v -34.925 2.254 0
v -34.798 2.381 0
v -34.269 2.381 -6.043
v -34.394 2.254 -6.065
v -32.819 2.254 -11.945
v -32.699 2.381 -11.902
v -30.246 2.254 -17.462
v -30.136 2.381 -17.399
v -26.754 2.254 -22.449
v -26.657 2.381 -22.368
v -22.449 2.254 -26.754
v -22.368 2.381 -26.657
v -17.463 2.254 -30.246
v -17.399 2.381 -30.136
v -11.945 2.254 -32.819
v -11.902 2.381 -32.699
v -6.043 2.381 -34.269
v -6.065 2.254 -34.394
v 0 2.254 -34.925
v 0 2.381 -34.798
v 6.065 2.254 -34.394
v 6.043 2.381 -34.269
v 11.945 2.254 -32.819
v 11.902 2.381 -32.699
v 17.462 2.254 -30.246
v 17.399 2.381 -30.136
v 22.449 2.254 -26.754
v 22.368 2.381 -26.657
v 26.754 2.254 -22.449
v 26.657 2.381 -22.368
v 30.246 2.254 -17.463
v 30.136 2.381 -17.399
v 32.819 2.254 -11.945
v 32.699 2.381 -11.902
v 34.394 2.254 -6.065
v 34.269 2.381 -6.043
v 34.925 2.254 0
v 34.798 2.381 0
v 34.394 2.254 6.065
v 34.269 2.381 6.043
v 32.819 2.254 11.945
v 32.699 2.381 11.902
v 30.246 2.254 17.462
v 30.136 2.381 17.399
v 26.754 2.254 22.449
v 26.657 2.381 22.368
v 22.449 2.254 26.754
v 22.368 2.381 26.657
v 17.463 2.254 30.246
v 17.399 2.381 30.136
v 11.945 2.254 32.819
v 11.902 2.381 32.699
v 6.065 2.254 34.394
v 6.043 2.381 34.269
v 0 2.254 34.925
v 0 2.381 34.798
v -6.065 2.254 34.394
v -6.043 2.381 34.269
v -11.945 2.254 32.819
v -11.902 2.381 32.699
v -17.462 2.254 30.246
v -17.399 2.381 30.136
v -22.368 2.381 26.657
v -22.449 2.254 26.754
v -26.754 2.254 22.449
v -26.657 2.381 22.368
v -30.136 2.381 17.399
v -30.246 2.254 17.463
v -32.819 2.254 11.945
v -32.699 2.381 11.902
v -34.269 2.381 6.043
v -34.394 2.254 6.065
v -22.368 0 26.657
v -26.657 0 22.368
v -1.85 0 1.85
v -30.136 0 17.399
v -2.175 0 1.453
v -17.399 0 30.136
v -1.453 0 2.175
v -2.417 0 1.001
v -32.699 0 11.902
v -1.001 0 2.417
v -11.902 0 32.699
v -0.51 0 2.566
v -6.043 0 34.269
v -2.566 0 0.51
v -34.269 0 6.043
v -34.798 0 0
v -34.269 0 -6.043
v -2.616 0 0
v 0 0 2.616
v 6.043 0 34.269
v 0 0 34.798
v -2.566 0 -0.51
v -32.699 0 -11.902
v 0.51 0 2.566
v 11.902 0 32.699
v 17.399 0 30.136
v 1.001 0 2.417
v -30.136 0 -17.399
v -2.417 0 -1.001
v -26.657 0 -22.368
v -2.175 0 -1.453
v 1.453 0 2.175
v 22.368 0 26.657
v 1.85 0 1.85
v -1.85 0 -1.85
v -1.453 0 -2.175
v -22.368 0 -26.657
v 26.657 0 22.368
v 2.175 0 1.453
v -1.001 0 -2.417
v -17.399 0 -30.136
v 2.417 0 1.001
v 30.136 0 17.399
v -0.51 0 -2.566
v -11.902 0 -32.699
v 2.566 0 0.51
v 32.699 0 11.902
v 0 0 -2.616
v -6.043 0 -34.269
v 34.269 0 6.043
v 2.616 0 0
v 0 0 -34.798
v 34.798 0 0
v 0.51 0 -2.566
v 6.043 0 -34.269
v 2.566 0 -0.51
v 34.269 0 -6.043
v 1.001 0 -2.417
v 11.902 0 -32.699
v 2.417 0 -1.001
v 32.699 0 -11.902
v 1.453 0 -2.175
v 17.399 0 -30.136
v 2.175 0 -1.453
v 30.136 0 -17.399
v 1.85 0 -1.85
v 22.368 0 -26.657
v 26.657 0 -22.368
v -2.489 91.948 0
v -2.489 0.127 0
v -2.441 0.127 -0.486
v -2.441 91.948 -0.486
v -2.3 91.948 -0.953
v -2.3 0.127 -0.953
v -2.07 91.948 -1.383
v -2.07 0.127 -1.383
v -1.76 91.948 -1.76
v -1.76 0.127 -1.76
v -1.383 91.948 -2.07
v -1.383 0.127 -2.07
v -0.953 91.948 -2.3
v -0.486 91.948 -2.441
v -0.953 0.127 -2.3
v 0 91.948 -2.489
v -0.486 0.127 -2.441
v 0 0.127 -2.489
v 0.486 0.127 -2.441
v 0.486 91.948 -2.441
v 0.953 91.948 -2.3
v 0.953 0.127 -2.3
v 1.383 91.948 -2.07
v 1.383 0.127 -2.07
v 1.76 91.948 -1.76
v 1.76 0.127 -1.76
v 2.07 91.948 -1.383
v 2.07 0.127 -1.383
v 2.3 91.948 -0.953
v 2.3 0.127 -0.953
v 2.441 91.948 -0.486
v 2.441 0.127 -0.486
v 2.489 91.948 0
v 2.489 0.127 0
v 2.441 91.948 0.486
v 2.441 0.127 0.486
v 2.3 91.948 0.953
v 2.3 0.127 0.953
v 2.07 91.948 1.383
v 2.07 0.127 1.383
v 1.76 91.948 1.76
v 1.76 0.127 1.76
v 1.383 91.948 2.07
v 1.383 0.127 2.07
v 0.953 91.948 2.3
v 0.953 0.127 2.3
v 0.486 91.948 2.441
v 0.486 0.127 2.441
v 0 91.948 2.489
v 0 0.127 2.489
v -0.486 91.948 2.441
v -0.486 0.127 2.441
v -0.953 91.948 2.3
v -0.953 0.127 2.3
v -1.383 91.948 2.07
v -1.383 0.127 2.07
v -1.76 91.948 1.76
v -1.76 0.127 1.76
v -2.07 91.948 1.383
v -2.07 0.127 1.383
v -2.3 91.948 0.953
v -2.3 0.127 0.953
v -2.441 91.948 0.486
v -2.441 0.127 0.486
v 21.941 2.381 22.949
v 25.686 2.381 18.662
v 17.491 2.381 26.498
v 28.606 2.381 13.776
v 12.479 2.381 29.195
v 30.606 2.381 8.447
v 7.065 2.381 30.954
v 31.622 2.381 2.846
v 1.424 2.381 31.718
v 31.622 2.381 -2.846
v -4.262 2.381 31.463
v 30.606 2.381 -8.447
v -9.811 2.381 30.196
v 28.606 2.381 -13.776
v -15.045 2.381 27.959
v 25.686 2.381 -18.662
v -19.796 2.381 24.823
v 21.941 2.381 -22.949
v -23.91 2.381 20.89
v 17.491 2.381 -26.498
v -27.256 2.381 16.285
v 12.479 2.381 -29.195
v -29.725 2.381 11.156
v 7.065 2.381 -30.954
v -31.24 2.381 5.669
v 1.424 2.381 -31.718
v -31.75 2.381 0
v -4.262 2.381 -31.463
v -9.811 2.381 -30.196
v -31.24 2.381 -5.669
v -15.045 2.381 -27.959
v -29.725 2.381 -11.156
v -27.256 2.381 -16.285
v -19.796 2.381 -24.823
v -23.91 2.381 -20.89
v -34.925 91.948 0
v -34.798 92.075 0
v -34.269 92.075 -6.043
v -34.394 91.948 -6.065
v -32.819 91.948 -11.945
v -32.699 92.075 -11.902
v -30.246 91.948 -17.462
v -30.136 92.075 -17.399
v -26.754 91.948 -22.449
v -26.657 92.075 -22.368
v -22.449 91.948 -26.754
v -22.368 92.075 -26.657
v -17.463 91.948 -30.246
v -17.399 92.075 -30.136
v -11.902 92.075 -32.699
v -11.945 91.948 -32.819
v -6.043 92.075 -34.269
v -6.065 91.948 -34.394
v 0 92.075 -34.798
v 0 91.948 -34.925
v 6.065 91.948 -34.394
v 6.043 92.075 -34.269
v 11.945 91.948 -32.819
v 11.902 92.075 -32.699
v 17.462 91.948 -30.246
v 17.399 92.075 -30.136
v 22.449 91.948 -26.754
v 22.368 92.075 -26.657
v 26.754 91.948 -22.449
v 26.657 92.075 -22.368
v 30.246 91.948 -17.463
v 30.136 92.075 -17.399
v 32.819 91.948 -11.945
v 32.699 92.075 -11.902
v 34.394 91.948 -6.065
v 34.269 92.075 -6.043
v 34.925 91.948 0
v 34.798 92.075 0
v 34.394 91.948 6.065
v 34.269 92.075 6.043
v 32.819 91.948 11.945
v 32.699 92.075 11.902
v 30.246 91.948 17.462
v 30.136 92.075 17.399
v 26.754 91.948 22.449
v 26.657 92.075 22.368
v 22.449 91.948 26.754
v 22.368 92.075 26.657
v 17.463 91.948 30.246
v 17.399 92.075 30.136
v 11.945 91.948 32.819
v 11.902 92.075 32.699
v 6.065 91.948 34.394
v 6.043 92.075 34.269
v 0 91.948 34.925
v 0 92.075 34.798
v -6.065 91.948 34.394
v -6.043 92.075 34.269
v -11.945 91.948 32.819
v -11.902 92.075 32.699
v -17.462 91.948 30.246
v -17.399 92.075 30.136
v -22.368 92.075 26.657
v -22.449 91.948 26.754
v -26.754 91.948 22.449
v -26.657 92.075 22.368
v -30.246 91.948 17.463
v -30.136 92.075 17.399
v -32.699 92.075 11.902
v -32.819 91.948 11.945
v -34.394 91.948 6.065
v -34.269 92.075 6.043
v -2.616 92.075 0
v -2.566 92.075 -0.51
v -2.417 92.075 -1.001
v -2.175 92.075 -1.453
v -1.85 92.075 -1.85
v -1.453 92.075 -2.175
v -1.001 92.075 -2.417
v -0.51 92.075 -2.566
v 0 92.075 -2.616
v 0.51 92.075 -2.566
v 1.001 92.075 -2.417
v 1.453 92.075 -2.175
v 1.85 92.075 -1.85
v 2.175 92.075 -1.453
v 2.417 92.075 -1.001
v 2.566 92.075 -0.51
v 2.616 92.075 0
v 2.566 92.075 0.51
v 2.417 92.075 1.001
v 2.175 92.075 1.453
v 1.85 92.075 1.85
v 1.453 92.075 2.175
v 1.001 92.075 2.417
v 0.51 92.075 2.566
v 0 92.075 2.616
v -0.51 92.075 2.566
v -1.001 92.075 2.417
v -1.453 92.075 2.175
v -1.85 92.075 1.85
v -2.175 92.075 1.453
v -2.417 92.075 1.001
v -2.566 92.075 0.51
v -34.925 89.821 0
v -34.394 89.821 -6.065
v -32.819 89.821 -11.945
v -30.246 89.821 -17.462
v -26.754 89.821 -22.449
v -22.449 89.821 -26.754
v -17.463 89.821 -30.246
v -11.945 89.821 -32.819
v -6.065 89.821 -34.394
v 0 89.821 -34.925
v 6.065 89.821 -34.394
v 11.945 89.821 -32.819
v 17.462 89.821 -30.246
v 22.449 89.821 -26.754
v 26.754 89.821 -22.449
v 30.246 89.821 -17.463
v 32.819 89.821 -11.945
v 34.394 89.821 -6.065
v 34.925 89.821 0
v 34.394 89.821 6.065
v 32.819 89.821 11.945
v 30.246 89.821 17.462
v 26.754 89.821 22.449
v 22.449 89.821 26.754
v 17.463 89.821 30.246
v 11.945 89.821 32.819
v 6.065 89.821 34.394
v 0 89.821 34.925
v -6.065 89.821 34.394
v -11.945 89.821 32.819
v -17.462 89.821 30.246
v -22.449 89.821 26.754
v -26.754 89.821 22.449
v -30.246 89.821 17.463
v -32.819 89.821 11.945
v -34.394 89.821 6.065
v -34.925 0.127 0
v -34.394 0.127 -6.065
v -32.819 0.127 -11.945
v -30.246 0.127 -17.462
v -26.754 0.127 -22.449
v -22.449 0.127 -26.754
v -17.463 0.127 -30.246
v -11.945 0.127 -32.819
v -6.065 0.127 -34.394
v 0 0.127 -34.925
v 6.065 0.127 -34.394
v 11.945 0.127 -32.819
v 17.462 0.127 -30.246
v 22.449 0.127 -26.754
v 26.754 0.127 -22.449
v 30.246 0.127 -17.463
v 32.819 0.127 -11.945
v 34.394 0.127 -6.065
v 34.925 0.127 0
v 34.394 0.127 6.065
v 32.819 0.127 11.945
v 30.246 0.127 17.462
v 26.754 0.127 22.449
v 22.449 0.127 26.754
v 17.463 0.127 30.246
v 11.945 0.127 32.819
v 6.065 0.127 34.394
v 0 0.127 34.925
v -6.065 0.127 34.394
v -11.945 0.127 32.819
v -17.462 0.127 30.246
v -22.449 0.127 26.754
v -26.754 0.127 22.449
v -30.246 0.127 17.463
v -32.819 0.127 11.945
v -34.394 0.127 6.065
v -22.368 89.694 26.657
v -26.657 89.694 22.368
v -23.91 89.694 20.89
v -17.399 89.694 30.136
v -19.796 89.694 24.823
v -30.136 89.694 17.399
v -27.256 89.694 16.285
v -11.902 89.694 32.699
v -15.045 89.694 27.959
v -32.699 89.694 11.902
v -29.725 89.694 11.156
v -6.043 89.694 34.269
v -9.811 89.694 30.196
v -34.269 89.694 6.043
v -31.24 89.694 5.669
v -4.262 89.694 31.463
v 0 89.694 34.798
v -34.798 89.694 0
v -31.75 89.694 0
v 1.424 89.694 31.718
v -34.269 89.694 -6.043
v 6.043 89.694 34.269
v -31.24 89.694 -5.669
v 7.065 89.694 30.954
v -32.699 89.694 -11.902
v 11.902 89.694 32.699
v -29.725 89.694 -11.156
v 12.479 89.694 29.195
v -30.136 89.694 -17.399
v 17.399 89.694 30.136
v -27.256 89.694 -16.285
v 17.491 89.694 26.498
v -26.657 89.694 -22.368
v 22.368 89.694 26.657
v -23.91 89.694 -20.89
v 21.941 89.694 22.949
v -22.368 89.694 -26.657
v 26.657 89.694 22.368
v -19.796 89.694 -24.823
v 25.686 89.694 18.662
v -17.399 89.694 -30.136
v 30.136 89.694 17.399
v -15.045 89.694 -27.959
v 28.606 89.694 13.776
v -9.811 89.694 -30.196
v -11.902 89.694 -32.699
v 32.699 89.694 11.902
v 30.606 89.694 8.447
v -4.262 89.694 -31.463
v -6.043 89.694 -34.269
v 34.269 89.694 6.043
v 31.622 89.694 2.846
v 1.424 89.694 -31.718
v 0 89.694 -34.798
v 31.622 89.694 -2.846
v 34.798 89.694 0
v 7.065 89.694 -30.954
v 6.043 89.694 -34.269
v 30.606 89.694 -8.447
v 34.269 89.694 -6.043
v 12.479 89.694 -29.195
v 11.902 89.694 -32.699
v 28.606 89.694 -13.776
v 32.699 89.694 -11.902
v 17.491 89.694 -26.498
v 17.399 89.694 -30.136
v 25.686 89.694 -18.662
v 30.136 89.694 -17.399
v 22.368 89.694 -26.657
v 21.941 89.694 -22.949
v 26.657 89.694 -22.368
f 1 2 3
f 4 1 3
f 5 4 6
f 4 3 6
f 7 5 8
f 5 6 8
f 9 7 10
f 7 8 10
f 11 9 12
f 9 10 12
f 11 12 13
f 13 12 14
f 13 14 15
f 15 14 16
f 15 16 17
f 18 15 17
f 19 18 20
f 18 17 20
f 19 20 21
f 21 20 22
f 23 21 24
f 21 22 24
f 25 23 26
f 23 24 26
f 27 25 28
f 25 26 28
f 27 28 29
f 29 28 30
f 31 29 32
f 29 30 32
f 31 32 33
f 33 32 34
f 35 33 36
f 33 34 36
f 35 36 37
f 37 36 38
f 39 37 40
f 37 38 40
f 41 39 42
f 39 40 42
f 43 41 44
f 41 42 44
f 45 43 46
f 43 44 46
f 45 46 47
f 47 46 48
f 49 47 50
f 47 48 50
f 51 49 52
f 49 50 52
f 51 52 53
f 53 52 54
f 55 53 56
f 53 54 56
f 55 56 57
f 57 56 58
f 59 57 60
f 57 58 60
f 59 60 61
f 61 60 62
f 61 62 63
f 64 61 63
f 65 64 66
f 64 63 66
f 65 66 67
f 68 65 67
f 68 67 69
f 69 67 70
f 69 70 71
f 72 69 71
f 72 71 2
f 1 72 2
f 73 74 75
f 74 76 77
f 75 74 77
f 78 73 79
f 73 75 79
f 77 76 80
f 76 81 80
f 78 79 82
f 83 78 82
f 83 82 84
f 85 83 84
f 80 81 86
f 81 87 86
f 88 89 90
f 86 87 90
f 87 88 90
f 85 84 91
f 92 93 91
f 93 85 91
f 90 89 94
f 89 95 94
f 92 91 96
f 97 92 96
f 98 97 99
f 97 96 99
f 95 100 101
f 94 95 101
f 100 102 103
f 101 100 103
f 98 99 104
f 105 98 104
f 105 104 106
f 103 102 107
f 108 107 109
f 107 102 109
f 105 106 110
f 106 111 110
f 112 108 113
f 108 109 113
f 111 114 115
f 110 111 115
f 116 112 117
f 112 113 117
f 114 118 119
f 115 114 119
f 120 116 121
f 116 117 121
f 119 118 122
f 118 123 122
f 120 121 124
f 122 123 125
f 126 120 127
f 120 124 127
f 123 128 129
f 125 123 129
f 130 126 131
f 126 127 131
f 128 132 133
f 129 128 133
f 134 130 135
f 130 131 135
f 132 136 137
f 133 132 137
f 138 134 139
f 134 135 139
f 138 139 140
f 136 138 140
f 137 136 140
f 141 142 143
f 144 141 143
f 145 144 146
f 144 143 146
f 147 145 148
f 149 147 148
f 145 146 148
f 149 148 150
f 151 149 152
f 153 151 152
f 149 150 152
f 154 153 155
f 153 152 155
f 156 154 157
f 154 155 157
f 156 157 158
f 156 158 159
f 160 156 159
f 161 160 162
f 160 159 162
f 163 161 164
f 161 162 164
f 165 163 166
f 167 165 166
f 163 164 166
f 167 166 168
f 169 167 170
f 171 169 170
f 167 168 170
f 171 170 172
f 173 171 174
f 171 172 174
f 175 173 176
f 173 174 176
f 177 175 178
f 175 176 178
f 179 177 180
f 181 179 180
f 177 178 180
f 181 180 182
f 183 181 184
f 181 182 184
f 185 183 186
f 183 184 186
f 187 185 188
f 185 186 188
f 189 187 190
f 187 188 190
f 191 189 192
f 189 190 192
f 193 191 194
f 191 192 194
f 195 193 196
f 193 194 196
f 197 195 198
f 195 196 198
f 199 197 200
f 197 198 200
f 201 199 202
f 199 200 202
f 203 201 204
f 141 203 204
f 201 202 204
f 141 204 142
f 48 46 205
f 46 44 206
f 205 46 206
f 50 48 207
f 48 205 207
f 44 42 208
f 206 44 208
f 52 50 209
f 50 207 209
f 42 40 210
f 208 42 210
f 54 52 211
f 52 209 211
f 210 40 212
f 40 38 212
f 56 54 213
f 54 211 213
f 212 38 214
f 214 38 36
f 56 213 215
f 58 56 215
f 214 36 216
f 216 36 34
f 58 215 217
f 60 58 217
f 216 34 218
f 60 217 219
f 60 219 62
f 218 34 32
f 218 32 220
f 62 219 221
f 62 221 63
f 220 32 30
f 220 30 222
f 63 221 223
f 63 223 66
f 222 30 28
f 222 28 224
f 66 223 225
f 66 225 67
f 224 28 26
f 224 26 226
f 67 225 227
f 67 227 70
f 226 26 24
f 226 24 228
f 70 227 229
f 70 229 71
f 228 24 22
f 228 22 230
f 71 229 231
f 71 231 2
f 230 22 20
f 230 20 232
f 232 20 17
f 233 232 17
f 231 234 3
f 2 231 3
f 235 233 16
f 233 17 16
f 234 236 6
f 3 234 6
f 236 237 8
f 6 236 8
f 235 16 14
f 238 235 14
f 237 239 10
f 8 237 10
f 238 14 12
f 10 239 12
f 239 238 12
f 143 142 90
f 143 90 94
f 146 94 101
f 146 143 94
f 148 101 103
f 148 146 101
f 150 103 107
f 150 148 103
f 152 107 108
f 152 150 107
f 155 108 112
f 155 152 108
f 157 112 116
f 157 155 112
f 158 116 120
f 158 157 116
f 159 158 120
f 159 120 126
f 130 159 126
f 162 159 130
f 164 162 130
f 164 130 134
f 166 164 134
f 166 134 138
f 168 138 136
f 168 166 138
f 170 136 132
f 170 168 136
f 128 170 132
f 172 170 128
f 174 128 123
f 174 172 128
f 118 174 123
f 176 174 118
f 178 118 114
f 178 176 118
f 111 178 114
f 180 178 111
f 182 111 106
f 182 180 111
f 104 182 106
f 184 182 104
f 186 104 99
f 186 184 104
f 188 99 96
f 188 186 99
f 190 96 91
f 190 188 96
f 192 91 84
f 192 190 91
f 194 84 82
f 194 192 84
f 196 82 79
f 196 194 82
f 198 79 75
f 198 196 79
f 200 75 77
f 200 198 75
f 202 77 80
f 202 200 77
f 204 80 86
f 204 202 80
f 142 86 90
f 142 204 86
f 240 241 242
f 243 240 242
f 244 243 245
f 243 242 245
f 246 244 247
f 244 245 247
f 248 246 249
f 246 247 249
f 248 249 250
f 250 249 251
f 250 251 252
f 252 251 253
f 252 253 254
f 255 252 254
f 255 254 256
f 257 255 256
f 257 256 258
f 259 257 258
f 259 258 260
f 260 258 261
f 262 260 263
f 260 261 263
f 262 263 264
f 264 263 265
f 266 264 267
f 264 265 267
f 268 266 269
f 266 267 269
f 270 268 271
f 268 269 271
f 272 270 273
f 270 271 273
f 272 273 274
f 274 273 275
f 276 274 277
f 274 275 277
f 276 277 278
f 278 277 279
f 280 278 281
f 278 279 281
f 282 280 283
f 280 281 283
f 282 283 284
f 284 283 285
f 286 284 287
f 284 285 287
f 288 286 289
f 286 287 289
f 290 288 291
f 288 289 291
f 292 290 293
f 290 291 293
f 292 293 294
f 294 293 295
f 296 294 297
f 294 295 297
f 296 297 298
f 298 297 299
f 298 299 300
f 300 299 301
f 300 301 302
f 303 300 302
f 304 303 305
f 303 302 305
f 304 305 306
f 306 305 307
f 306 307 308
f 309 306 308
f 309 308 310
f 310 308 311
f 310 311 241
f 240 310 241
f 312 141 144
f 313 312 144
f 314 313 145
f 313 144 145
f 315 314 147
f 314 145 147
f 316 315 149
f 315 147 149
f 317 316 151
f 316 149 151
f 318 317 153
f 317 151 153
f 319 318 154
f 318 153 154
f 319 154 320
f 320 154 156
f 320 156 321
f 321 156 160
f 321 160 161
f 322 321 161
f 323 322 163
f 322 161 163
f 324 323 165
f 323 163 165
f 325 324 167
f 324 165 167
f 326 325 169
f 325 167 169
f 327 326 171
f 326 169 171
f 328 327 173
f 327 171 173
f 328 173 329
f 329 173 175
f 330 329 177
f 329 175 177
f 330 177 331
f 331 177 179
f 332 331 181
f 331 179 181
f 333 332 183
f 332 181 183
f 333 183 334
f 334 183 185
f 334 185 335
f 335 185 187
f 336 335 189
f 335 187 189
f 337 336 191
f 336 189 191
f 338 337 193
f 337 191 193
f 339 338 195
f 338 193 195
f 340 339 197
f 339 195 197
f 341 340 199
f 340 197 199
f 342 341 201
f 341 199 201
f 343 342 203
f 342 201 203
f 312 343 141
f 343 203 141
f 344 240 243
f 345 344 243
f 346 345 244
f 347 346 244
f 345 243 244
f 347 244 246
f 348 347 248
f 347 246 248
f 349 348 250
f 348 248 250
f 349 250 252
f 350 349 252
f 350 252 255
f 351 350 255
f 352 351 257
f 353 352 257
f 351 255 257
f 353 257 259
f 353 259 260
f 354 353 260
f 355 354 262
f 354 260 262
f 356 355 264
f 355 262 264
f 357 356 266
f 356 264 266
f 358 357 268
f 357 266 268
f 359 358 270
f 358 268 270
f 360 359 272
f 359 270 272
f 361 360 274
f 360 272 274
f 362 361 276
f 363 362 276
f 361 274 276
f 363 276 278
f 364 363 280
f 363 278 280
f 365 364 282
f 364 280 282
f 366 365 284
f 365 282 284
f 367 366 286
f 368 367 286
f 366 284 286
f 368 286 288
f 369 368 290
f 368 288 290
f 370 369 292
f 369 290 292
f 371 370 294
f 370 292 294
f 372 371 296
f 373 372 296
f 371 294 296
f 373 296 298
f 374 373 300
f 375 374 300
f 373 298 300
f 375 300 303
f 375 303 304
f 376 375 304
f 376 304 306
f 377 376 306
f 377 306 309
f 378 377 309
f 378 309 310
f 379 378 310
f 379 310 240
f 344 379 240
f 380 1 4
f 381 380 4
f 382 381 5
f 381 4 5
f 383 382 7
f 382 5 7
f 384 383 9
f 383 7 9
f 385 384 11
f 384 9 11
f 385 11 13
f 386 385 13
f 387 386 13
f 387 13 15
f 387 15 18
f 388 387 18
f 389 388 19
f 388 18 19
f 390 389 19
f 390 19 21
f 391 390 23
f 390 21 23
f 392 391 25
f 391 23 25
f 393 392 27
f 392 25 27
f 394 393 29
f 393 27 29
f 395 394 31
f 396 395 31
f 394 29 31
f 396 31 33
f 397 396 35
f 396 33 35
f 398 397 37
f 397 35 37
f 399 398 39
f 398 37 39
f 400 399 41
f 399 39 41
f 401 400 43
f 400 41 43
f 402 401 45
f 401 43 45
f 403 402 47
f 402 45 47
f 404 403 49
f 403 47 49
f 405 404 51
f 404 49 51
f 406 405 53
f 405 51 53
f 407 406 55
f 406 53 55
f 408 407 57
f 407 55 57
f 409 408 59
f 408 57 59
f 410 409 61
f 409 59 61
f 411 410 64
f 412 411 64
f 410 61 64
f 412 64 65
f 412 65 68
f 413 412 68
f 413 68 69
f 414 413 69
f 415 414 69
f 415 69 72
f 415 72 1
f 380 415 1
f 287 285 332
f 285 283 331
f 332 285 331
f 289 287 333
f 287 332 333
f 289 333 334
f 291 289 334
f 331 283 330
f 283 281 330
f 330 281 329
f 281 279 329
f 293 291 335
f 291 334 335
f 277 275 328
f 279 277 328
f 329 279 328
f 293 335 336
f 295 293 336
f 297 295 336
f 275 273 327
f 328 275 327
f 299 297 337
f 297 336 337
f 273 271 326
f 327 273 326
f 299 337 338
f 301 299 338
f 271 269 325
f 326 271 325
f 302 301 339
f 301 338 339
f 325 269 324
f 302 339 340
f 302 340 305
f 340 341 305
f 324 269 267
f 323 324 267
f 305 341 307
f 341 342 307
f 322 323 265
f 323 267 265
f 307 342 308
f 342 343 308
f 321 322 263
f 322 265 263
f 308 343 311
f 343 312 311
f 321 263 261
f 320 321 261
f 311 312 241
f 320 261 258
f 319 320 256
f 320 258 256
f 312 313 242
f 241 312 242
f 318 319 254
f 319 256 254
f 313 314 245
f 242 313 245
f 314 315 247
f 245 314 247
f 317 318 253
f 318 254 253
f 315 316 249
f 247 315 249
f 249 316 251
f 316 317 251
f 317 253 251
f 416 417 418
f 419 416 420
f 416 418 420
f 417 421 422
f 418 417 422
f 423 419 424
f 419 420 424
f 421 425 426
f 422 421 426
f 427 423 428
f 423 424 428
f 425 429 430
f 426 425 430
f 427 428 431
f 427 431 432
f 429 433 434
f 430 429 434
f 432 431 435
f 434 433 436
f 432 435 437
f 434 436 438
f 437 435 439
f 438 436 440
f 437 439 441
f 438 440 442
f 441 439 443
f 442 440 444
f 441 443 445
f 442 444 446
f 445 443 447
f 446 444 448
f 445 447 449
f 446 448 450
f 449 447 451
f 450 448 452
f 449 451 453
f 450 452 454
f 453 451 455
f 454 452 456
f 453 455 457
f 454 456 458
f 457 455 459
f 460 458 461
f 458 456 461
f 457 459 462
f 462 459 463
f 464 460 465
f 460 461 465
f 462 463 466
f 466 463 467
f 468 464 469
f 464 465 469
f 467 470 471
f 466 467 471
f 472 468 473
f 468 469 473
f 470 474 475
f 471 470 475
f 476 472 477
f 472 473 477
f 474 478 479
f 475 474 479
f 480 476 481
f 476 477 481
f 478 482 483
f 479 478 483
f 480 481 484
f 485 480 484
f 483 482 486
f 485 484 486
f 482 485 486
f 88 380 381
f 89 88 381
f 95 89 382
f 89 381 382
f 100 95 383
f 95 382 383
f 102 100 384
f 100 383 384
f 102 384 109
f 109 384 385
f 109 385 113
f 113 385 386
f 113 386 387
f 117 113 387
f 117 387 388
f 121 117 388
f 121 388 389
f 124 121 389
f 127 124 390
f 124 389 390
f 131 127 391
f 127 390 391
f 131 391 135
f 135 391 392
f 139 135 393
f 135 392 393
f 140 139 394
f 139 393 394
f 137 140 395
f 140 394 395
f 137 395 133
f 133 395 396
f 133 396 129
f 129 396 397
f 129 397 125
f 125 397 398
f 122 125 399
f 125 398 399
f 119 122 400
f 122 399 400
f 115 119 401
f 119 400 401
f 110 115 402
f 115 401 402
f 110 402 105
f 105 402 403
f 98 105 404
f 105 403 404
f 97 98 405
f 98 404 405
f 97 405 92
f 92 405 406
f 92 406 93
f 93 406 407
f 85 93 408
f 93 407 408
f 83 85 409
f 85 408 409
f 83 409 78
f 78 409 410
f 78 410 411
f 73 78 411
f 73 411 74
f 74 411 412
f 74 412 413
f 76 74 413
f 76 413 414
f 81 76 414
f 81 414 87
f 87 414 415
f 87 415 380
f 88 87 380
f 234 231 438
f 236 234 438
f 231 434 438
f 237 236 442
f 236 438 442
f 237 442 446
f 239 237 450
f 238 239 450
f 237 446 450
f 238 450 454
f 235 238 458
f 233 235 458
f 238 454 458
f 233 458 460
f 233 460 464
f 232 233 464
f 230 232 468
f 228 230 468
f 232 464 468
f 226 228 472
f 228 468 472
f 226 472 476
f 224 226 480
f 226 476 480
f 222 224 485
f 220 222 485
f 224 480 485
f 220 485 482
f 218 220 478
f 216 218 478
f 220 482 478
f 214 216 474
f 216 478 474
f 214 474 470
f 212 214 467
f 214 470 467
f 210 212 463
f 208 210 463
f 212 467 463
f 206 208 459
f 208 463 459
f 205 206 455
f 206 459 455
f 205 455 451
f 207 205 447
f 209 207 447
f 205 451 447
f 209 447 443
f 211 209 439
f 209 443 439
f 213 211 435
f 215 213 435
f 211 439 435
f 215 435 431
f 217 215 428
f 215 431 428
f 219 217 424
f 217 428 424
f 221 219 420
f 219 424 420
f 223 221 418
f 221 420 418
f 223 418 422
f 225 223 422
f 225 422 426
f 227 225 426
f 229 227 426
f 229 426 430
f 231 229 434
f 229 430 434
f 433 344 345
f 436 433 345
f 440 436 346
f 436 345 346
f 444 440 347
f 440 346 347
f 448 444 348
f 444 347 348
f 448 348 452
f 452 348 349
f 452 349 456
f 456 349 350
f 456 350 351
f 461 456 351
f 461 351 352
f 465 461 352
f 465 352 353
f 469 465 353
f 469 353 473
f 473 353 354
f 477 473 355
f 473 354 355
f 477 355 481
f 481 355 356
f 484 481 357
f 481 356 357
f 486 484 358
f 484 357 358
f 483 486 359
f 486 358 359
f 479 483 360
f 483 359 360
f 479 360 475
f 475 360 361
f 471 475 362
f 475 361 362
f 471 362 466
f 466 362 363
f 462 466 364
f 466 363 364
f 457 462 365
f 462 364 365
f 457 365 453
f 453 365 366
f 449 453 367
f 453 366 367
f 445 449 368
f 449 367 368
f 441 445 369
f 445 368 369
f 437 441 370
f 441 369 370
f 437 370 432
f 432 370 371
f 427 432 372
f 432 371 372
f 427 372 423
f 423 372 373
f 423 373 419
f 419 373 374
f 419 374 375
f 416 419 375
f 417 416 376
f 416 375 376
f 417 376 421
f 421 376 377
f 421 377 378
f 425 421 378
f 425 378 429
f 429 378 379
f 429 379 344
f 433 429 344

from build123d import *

# Parameters (mm, degrees)
CHAMFER1_SIZE = 0.127


with BuildPart() as part:
    # Sketch1 → Revolve1 (revolve)
    with BuildSketch(Plane.XY, mode=Mode.PRIVATE) as revolve1_sk:
        Polygon((2.4892, 4.7752), (2.4892, 0), (34.925, 0), (34.925, 2.38125), (31.75, 2.38125), (31.75, 89.69375), (34.925, 89.69375), (34.925, 92.075), (2.4892, 92.075), (2.4892, 46.0375), (2.4892, 36.4998), align=None)
    revolve(revolve1_sk.sketch.rotate(Axis((0, 92.075, 0), (0, -1, 0)), 180), axis=Axis((0, 92.075, 0), (0, -1, 0)))

    # Chamfer1
    chamfer1_edges = [part.edges().sort_by_distance(p)[0] for p in [
        (34.925, 2.38125, 0),
        (34.925, 0, 0),
        (2.4892, 0, 0),
        (2.4892, 92.075, 0),
        (34.925, 92.075, 0),
        (34.925, 89.69375, 0),
    ]]
    chamfer(chamfer1_edges, length=CHAMFER1_SIZE)


solid = part.part
